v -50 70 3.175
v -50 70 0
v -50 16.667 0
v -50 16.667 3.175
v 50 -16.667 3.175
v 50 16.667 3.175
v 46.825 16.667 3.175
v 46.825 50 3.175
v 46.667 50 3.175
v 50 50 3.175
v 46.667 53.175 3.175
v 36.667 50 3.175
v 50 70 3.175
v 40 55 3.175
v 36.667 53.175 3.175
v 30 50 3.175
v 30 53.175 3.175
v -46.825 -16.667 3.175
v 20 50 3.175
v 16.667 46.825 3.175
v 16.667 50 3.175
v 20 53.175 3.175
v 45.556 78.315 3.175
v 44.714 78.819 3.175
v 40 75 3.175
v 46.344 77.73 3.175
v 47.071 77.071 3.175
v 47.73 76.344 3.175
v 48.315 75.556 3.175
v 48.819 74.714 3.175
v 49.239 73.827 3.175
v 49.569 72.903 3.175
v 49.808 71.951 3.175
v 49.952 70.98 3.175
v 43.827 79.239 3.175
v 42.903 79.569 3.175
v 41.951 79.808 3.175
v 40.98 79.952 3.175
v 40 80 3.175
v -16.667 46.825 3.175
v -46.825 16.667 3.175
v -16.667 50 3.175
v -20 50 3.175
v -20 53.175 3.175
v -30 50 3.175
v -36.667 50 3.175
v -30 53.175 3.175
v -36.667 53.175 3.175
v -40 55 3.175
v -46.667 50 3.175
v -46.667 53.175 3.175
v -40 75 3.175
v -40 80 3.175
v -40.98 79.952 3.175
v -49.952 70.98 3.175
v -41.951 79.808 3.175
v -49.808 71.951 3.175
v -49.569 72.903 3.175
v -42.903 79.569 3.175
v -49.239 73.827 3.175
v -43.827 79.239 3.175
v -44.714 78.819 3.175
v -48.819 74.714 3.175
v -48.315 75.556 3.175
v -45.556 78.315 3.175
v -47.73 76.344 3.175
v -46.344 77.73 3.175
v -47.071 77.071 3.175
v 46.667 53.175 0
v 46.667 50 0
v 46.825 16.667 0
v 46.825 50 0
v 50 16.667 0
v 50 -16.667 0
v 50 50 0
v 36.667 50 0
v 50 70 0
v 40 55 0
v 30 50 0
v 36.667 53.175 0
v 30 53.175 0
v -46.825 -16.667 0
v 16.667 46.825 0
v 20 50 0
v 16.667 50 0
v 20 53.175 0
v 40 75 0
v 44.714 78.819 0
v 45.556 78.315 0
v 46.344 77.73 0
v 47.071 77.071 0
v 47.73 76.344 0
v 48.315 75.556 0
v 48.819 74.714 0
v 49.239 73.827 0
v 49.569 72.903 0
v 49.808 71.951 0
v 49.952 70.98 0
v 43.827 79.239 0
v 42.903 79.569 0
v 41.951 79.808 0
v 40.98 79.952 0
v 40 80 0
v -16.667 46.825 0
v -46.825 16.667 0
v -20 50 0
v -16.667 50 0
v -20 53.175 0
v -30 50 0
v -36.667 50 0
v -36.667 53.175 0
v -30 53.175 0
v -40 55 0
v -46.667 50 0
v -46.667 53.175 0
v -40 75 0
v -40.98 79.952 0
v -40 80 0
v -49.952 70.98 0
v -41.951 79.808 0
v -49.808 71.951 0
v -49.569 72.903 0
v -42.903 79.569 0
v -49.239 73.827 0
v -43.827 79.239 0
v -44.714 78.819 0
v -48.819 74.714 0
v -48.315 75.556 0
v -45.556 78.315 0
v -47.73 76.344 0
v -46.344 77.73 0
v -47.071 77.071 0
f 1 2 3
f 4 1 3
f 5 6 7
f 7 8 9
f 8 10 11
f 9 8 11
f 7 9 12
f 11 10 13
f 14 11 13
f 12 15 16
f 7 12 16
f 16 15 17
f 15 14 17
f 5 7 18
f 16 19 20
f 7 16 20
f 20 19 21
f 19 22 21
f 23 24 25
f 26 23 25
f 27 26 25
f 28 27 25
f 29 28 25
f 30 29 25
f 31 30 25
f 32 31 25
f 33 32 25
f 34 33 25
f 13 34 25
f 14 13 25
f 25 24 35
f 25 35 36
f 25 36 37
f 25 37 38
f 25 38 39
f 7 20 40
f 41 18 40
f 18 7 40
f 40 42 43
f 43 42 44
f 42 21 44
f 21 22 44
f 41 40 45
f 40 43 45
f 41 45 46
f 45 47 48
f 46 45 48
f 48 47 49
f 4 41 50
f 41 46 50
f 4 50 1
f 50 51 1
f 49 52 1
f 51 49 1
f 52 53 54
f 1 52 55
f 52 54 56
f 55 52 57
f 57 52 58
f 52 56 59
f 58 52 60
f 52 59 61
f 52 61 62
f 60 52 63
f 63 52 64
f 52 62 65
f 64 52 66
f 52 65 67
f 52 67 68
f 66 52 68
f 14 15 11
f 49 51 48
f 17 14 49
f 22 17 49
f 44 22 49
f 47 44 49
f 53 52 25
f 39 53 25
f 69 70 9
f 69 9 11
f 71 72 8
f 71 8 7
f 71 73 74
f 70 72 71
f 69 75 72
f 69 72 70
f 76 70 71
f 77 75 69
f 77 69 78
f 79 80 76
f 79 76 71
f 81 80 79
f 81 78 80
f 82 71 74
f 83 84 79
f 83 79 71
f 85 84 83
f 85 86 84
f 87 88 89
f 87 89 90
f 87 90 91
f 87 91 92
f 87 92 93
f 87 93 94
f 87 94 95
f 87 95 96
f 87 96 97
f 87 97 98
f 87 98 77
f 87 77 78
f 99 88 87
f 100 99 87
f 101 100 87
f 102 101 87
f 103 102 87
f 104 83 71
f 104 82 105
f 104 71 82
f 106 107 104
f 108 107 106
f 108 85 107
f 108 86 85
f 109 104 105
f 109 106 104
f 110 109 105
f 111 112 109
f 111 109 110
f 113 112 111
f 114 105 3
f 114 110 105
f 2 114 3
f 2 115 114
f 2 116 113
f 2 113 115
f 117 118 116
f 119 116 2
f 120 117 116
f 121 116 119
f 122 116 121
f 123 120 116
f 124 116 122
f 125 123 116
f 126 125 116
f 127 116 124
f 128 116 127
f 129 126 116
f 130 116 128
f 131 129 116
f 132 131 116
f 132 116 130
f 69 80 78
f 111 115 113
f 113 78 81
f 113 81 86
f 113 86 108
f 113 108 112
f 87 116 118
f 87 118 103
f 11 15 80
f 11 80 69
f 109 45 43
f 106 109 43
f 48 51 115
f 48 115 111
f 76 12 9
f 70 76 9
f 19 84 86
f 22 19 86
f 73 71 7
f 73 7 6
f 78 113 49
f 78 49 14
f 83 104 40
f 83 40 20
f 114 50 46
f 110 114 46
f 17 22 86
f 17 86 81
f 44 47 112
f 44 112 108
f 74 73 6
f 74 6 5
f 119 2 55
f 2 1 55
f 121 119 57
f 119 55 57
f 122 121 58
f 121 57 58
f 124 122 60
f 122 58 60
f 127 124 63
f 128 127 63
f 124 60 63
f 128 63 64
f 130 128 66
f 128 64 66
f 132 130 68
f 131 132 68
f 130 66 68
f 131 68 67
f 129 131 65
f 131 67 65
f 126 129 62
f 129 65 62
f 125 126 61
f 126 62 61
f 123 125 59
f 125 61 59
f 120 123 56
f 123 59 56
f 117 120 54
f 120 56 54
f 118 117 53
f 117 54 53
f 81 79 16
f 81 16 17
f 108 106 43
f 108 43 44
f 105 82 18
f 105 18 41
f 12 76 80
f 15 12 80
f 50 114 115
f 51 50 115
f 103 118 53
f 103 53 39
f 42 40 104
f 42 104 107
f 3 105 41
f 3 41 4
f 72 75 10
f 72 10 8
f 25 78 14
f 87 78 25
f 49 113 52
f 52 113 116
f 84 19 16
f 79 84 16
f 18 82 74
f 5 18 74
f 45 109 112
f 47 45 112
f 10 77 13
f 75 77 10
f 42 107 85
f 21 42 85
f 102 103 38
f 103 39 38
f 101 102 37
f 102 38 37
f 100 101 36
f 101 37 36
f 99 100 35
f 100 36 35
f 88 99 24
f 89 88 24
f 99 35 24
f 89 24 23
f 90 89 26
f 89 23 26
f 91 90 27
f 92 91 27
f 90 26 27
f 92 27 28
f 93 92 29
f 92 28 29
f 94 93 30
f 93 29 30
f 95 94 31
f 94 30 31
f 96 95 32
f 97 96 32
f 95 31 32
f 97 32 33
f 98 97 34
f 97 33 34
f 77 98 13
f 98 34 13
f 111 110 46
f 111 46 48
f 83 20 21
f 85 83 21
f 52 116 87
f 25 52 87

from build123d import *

# Parameters (mm, degrees)
SKETCH1_W           = 33.333333334
SKETCH1_H           = 3.175
SKETCH1_W_2         = 80
SKETCH1_H_2         = 20
BOSS_EXTRUDE1_DEPTH = 3.175
FILLET1_R           = 10
SKETCH2_W           = 10
SKETCH2_H           = 3.175
CUT_EXTRUDE1_DEPTH  = 3.175


with BuildPart() as part:
    # Sketch1 → Boss-Extrude1 (new body)
    with BuildSketch(Plane.XY):
        Polygon((-50, 16.666666667), (-50, 50), (-50, 80), (50, 80), (50, 50), (46.825, 50), (46.825, 16.666666667), (50, 16.666666667), (50, -16.666666667), (46.825, -16.666666667), (-46.825, -16.666666667), (-46.825, 16.666666667), align=None)
        with Locations((0, 48.4125)):
            Rectangle(SKETCH1_W, SKETCH1_H, mode=Mode.SUBTRACT)
        with Locations((0, 65)):
            Rectangle(SKETCH1_W_2, SKETCH1_H_2, mode=Mode.SUBTRACT)
    extrude(amount=BOSS_EXTRUDE1_DEPTH)

    # Fillet1
    fillet1_edges = [part.edges().sort_by_distance(p)[0] for p in [
        (-50, 80, 1.5875),
        (50, 80, 1.5875),
    ]]
    fillet(fillet1_edges, radius=FILLET1_R)

    # Sketch2 → Cut-Extrude1 (cut)
    with BuildSketch(Plane.XY.offset(3.175)):
        with Locations((25, 51.5875)):
            Rectangle(SKETCH2_W, SKETCH2_H)
        with Locations((-41.666666667, 51.5875)):
            Rectangle(SKETCH2_W, SKETCH2_H)
        with Locations((-25, 51.5875)):
            Rectangle(SKETCH2_W, SKETCH2_H)
        with Locations((41.666666667, 51.5875)):
            Rectangle(SKETCH2_W, SKETCH2_H)
    extrude(amount=-CUT_EXTRUDE1_DEPTH, mode=Mode.SUBTRACT)


solid = part.part
